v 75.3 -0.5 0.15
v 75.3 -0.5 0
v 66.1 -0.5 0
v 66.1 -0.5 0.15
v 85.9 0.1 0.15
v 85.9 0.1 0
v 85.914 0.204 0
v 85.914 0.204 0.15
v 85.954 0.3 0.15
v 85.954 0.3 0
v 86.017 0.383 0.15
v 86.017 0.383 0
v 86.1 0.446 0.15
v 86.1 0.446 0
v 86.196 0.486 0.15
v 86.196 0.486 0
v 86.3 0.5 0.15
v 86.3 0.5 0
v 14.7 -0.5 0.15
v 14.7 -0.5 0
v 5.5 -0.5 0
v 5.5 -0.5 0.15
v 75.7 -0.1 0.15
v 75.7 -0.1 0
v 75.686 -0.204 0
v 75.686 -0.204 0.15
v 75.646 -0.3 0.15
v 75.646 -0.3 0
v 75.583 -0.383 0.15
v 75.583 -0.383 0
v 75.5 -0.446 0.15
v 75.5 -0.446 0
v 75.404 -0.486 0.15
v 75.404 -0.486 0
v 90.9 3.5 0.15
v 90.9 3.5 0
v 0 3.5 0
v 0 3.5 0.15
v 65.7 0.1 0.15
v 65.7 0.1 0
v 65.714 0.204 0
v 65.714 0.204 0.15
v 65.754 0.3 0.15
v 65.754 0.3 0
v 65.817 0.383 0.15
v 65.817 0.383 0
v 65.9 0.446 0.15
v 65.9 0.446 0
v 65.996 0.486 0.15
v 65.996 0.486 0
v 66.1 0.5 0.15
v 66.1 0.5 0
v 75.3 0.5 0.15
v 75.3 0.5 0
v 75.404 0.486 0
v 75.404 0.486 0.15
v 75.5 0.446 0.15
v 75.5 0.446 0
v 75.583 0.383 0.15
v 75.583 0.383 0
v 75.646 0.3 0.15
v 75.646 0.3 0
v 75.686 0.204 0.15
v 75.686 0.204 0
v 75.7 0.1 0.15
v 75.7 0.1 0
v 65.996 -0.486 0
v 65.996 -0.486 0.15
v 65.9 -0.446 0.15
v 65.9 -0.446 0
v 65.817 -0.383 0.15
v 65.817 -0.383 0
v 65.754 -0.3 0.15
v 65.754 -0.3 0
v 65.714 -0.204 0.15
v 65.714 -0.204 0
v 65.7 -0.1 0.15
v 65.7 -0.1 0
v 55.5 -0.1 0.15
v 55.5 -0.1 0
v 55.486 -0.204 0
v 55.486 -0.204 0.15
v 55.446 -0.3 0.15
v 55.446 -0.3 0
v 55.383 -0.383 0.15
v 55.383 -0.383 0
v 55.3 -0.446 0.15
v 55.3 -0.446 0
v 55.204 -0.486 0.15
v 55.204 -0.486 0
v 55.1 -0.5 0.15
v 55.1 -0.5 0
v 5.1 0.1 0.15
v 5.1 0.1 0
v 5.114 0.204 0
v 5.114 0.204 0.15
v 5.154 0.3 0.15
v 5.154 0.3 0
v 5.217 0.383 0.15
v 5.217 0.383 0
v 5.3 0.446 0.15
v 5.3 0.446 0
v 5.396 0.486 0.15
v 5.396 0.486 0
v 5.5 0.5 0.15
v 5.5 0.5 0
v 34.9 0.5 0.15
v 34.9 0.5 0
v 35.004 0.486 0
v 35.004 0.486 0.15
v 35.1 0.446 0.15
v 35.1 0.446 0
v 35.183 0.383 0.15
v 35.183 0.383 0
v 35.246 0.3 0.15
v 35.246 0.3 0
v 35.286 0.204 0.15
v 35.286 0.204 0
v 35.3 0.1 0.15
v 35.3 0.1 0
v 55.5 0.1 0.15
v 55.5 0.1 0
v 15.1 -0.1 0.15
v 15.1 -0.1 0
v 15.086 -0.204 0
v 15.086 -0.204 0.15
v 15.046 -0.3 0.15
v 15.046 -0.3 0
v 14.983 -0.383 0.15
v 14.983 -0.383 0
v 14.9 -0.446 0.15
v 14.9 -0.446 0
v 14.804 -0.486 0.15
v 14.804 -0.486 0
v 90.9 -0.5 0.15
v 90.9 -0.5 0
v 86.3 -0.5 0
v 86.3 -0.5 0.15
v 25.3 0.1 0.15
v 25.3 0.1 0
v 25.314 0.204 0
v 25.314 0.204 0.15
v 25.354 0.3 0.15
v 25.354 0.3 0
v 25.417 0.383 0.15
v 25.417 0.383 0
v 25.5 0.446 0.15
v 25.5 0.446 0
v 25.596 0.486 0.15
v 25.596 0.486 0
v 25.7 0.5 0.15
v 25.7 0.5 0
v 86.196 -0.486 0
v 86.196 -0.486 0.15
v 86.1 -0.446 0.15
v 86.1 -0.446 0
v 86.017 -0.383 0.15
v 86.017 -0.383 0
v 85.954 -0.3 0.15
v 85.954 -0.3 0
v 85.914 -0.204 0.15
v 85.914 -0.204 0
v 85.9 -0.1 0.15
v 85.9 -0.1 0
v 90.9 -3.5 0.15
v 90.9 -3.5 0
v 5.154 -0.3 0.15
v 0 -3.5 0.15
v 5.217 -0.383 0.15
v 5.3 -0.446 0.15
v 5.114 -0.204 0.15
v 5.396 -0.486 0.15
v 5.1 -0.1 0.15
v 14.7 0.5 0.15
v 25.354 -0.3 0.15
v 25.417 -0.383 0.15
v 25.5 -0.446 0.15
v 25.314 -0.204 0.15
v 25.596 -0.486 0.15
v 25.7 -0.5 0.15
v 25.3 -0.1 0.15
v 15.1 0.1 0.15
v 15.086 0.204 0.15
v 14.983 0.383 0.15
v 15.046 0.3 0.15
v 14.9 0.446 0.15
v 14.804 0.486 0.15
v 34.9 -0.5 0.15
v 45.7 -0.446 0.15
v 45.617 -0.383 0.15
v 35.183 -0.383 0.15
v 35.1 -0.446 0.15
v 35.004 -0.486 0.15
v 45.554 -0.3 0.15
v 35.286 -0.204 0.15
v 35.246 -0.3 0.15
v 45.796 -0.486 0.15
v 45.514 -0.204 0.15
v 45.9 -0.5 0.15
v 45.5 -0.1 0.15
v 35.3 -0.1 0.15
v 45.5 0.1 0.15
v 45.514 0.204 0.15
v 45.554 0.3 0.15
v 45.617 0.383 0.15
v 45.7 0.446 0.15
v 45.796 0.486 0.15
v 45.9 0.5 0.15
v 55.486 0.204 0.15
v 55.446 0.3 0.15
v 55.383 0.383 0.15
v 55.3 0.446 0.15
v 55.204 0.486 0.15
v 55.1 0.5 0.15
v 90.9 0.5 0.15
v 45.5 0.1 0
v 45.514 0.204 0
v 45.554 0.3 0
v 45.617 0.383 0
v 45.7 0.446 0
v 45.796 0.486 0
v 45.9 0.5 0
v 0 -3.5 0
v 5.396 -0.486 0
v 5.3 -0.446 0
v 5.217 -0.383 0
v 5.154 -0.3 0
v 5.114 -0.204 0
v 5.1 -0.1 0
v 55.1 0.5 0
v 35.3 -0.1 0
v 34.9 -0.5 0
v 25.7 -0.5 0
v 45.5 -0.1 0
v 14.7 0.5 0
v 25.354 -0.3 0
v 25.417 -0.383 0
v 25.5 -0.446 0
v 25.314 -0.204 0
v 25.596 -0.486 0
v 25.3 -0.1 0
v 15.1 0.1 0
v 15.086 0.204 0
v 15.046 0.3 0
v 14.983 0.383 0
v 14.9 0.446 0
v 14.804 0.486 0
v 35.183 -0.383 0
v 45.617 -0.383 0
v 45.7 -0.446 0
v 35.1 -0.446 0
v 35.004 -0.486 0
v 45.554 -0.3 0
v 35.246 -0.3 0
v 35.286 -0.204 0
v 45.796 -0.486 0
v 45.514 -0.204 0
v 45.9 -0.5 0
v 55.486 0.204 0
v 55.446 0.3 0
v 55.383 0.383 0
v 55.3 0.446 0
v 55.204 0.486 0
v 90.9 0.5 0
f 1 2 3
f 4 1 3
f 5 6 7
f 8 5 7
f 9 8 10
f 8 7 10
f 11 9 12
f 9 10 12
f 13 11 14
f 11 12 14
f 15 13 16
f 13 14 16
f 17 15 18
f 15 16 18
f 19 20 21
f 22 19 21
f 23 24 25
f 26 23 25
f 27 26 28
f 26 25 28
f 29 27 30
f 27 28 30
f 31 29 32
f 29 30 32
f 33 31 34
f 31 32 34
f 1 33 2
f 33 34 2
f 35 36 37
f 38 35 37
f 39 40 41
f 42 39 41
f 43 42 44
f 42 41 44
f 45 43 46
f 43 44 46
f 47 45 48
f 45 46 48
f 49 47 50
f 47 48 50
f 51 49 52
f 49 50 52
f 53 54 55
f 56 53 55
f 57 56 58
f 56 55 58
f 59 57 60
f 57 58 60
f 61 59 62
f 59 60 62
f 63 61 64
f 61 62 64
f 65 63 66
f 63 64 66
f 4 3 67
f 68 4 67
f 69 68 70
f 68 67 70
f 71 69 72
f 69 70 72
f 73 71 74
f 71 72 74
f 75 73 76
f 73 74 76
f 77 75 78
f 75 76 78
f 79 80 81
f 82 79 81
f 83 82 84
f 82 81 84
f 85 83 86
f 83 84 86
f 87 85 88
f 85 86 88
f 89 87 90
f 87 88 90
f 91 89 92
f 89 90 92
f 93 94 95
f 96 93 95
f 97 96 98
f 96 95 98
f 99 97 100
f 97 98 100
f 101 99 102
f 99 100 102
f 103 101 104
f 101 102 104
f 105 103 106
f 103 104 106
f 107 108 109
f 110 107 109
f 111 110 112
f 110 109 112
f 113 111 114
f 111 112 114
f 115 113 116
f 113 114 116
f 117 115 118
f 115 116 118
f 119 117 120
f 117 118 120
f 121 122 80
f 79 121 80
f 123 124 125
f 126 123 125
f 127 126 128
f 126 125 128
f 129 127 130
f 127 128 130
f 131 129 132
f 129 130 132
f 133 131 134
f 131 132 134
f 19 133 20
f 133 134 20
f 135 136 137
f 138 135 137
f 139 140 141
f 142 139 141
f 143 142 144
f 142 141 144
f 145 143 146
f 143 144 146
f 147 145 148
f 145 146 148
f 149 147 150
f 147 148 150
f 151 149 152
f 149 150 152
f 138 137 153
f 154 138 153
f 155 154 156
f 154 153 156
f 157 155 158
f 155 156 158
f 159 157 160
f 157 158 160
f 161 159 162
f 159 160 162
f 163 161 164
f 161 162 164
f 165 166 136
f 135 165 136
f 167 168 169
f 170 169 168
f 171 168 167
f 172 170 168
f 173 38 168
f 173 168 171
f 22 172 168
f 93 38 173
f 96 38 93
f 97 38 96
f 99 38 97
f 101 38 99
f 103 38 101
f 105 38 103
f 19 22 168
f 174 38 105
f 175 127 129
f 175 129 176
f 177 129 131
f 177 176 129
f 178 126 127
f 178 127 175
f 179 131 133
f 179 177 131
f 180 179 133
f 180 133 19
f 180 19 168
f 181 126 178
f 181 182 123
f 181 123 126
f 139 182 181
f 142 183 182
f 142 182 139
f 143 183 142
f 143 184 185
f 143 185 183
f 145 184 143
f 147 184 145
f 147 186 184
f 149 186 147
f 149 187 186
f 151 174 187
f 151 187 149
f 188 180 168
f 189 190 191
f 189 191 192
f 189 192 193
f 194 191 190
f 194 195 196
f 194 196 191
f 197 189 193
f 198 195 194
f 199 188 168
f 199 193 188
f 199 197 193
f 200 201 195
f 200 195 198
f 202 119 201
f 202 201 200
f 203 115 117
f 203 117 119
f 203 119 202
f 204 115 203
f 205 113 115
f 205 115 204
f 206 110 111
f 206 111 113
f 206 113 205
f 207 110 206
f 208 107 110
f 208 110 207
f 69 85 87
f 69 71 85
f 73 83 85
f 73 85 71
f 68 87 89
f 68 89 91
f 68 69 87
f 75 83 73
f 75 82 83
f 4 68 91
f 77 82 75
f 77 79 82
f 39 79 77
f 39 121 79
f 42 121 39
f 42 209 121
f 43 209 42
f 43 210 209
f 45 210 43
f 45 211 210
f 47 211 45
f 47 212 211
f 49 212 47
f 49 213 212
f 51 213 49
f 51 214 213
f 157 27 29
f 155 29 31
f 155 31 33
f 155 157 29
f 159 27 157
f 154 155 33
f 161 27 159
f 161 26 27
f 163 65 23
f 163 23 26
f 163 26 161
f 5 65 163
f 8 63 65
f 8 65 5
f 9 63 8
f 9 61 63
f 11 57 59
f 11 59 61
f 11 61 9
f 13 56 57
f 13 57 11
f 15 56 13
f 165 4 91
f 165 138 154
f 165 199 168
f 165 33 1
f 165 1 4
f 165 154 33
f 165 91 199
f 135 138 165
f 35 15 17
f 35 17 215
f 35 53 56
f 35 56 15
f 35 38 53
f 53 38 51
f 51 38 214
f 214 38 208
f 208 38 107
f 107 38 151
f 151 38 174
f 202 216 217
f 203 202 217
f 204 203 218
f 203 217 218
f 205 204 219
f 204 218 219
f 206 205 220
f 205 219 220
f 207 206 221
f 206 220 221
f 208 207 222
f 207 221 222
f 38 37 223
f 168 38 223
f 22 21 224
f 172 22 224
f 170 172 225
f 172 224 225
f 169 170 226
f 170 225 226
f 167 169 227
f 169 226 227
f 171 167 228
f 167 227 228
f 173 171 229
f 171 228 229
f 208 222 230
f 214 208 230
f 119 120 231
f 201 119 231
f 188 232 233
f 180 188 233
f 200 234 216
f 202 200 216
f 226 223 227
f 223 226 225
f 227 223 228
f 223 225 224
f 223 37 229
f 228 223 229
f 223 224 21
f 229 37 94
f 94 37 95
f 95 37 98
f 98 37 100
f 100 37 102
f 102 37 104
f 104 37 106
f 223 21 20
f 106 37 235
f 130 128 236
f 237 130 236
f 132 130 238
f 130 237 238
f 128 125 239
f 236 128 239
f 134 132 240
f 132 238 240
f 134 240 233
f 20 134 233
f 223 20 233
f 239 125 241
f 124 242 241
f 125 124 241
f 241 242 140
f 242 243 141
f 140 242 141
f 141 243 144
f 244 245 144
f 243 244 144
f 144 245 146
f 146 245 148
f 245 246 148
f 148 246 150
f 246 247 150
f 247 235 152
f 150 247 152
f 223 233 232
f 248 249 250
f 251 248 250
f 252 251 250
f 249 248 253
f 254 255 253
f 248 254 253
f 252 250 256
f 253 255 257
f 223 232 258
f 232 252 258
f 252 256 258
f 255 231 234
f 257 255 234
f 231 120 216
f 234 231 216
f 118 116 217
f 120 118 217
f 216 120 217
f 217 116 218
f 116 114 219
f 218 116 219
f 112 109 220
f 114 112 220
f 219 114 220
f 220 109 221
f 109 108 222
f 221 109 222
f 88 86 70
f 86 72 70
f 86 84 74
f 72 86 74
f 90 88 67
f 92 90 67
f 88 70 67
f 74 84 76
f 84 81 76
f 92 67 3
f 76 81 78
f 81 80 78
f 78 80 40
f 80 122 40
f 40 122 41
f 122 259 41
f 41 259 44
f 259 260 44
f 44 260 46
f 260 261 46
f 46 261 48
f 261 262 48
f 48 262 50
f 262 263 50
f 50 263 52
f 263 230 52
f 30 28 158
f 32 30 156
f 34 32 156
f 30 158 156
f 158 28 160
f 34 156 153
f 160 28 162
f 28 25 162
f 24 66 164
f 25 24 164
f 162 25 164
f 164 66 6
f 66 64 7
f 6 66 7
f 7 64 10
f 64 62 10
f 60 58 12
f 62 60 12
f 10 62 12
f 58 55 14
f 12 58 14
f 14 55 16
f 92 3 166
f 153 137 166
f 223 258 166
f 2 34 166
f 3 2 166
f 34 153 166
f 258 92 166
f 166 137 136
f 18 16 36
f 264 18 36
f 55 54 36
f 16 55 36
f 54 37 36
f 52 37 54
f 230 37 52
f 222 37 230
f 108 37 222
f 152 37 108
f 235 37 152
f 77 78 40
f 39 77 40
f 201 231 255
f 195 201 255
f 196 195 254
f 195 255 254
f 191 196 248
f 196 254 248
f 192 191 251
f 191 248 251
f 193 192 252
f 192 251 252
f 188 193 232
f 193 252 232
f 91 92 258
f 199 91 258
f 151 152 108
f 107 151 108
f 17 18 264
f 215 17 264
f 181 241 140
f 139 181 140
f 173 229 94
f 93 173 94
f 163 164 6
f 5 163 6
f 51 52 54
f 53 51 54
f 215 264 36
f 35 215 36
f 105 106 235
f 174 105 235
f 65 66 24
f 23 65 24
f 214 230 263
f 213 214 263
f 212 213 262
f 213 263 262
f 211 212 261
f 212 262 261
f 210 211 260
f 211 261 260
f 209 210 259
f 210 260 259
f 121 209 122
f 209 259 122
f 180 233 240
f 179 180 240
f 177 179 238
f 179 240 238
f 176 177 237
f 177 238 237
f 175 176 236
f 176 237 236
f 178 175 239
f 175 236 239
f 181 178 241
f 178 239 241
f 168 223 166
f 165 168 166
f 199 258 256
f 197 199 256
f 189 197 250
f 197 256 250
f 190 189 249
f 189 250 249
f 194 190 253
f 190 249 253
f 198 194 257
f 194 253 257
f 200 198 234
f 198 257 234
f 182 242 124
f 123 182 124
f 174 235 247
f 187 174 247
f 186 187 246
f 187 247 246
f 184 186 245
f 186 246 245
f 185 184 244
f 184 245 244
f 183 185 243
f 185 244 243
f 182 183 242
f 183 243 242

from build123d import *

# Parameters (mm, degrees)
F1_DEPTH = 0.15


with BuildPart() as f1:
    # F0 (on Top) → F1 (new body)
    with BuildSketch(Plane.XY):
        with BuildLine():
            Line((70.7, -0.5), (70.7, -3.5))
            Line((70.7, -3.5), (80.8, -3.5))
            Line((80.8, -3.5), (90.9, -3.5))
            Line((90.9, -3.5), (90.9, -0.5))
            Line((90.9, -0.5), (86.3, -0.5))
            ThreePointArc((86.3, -0.5), (86.017157, -0.382843), (85.9, -0.1))
            Line((85.9, -0.1), (85.9, 0.1))
            ThreePointArc((85.9, 0.1), (86.017157, 0.382843), (86.3, 0.5))
            Line((86.3, 0.5), (90.9, 0.5))
            Line((90.9, 0.5), (90.9, 3.5))
            Line((90.9, 3.5), (80.8, 3.5))
            Line((80.8, 3.5), (70.7, 3.5))
            Line((70.7, 3.5), (70.7, 0.5))
            Line((70.7, 0.5), (75.3, 0.5))
            ThreePointArc((75.3, 0.5), (75.582843, 0.382843), (75.7, 0.1))
            Line((75.7, 0.1), (75.7, -0.1))
            ThreePointArc((75.7, -0.1), (75.582843, -0.382843), (75.3, -0.5))
            Line((75.3, -0.5), (70.7, -0.5))
        make_face()
        with BuildLine():
            Line((10.1, -0.5), (10.1, -3.5))
            Line((10.1, -3.5), (20.2, -3.5))
            Line((20.2, -3.5), (30.3, -3.5))
            Line((30.3, -3.5), (30.3, -0.5))
            Line((30.3, -0.5), (25.7, -0.5))
            ThreePointArc((25.7, -0.5), (25.417157, -0.382843), (25.3, -0.1))
            Line((25.3, -0.1), (25.3, 0.1))
            ThreePointArc((25.3, 0.1), (25.417157, 0.382843), (25.7, 0.5))
            Line((25.7, 0.5), (30.3, 0.5))
            Line((30.3, 0.5), (30.3, 3.5))
            Line((30.3, 3.5), (20.2, 3.5))
            Line((20.2, 3.5), (10.1, 3.5))
            Line((10.1, 3.5), (10.1, 0.5))
            Line((10.1, 0.5), (14.7, 0.5))
            ThreePointArc((14.7, 0.5), (14.982843, 0.382843), (15.1, 0.1))
            Line((15.1, 0.1), (15.1, -0.1))
            ThreePointArc((15.1, -0.1), (14.982843, -0.382843), (14.7, -0.5))
            Line((14.7, -0.5), (10.1, -0.5))
        make_face()
        with BuildLine():
            Line((30.3, -0.5), (30.3, -3.5))
            Line((30.3, -3.5), (40.4, -3.5))
            Line((40.4, -3.5), (50.5, -3.5))
            Line((50.5, -3.5), (50.5, -0.5))
            Line((50.5, -0.5), (45.9, -0.5))
            ThreePointArc((45.9, -0.5), (45.617157, -0.382843), (45.5, -0.1))
            Line((45.5, -0.1), (45.5, 0.1))
            ThreePointArc((45.5, 0.1), (45.617157, 0.382843), (45.9, 0.5))
            Line((45.9, 0.5), (50.5, 0.5))
            Line((50.5, 0.5), (50.5, 3.5))
            Line((50.5, 3.5), (40.4, 3.5))
            Line((40.4, 3.5), (30.3, 3.5))
            Line((30.3, 3.5), (30.3, 0.5))
            Line((30.3, 0.5), (34.9, 0.5))
            ThreePointArc((34.9, 0.5), (35.182843, 0.382843), (35.3, 0.1))
            Line((35.3, 0.1), (35.3, -0.1))
            ThreePointArc((35.3, -0.1), (35.182843, -0.382843), (34.9, -0.5))
            Line((34.9, -0.5), (30.3, -0.5))
        make_face()
        with BuildLine():
            Line((50.5, -0.5), (50.5, -3.5))
            Line((50.5, -3.5), (60.6, -3.5))
            Line((60.6, -3.5), (70.7, -3.5))
            Line((70.7, -3.5), (70.7, -0.5))
            Line((70.7, -0.5), (66.1, -0.5))
            ThreePointArc((66.1, -0.5), (65.817157, -0.382843), (65.7, -0.1))
            Line((65.7, -0.1), (65.7, 0.1))
            ThreePointArc((65.7, 0.1), (65.817157, 0.382843), (66.1, 0.5))
            Line((66.1, 0.5), (70.7, 0.5))
            Line((70.7, 0.5), (70.7, 3.5))
            Line((70.7, 3.5), (60.6, 3.5))
            Line((60.6, 3.5), (50.5, 3.5))
            Line((50.5, 3.5), (50.5, 0.5))
            Line((50.5, 0.5), (55.1, 0.5))
            ThreePointArc((55.1, 0.5), (55.382843, 0.382843), (55.5, 0.1))
            Line((55.5, 0.1), (55.5, -0.1))
            ThreePointArc((55.5, -0.1), (55.382843, -0.382843), (55.1, -0.5))
            Line((55.1, -0.5), (50.5, -0.5))
        make_face()
        with BuildLine():
            Line((0, 3.5), (0, -3.5))
            Line((0, -3.5), (10.1, -3.5))
            Line((10.1, -3.5), (10.1, -0.5))
            Line((10.1, -0.5), (5.5, -0.5))
            ThreePointArc((5.5, -0.5), (5.217157, -0.382843), (5.1, -0.1))
            Line((5.1, -0.1), (5.1, 0.1))
            ThreePointArc((5.1, 0.1), (5.217157, 0.382843), (5.5, 0.5))
            Line((5.5, 0.5), (10.1, 0.5))
            Line((10.1, 0.5), (10.1, 3.5))
            Line((10.1, 3.5), (0, 3.5))
        make_face()
    extrude(amount=F1_DEPTH)


solid = f1.part
